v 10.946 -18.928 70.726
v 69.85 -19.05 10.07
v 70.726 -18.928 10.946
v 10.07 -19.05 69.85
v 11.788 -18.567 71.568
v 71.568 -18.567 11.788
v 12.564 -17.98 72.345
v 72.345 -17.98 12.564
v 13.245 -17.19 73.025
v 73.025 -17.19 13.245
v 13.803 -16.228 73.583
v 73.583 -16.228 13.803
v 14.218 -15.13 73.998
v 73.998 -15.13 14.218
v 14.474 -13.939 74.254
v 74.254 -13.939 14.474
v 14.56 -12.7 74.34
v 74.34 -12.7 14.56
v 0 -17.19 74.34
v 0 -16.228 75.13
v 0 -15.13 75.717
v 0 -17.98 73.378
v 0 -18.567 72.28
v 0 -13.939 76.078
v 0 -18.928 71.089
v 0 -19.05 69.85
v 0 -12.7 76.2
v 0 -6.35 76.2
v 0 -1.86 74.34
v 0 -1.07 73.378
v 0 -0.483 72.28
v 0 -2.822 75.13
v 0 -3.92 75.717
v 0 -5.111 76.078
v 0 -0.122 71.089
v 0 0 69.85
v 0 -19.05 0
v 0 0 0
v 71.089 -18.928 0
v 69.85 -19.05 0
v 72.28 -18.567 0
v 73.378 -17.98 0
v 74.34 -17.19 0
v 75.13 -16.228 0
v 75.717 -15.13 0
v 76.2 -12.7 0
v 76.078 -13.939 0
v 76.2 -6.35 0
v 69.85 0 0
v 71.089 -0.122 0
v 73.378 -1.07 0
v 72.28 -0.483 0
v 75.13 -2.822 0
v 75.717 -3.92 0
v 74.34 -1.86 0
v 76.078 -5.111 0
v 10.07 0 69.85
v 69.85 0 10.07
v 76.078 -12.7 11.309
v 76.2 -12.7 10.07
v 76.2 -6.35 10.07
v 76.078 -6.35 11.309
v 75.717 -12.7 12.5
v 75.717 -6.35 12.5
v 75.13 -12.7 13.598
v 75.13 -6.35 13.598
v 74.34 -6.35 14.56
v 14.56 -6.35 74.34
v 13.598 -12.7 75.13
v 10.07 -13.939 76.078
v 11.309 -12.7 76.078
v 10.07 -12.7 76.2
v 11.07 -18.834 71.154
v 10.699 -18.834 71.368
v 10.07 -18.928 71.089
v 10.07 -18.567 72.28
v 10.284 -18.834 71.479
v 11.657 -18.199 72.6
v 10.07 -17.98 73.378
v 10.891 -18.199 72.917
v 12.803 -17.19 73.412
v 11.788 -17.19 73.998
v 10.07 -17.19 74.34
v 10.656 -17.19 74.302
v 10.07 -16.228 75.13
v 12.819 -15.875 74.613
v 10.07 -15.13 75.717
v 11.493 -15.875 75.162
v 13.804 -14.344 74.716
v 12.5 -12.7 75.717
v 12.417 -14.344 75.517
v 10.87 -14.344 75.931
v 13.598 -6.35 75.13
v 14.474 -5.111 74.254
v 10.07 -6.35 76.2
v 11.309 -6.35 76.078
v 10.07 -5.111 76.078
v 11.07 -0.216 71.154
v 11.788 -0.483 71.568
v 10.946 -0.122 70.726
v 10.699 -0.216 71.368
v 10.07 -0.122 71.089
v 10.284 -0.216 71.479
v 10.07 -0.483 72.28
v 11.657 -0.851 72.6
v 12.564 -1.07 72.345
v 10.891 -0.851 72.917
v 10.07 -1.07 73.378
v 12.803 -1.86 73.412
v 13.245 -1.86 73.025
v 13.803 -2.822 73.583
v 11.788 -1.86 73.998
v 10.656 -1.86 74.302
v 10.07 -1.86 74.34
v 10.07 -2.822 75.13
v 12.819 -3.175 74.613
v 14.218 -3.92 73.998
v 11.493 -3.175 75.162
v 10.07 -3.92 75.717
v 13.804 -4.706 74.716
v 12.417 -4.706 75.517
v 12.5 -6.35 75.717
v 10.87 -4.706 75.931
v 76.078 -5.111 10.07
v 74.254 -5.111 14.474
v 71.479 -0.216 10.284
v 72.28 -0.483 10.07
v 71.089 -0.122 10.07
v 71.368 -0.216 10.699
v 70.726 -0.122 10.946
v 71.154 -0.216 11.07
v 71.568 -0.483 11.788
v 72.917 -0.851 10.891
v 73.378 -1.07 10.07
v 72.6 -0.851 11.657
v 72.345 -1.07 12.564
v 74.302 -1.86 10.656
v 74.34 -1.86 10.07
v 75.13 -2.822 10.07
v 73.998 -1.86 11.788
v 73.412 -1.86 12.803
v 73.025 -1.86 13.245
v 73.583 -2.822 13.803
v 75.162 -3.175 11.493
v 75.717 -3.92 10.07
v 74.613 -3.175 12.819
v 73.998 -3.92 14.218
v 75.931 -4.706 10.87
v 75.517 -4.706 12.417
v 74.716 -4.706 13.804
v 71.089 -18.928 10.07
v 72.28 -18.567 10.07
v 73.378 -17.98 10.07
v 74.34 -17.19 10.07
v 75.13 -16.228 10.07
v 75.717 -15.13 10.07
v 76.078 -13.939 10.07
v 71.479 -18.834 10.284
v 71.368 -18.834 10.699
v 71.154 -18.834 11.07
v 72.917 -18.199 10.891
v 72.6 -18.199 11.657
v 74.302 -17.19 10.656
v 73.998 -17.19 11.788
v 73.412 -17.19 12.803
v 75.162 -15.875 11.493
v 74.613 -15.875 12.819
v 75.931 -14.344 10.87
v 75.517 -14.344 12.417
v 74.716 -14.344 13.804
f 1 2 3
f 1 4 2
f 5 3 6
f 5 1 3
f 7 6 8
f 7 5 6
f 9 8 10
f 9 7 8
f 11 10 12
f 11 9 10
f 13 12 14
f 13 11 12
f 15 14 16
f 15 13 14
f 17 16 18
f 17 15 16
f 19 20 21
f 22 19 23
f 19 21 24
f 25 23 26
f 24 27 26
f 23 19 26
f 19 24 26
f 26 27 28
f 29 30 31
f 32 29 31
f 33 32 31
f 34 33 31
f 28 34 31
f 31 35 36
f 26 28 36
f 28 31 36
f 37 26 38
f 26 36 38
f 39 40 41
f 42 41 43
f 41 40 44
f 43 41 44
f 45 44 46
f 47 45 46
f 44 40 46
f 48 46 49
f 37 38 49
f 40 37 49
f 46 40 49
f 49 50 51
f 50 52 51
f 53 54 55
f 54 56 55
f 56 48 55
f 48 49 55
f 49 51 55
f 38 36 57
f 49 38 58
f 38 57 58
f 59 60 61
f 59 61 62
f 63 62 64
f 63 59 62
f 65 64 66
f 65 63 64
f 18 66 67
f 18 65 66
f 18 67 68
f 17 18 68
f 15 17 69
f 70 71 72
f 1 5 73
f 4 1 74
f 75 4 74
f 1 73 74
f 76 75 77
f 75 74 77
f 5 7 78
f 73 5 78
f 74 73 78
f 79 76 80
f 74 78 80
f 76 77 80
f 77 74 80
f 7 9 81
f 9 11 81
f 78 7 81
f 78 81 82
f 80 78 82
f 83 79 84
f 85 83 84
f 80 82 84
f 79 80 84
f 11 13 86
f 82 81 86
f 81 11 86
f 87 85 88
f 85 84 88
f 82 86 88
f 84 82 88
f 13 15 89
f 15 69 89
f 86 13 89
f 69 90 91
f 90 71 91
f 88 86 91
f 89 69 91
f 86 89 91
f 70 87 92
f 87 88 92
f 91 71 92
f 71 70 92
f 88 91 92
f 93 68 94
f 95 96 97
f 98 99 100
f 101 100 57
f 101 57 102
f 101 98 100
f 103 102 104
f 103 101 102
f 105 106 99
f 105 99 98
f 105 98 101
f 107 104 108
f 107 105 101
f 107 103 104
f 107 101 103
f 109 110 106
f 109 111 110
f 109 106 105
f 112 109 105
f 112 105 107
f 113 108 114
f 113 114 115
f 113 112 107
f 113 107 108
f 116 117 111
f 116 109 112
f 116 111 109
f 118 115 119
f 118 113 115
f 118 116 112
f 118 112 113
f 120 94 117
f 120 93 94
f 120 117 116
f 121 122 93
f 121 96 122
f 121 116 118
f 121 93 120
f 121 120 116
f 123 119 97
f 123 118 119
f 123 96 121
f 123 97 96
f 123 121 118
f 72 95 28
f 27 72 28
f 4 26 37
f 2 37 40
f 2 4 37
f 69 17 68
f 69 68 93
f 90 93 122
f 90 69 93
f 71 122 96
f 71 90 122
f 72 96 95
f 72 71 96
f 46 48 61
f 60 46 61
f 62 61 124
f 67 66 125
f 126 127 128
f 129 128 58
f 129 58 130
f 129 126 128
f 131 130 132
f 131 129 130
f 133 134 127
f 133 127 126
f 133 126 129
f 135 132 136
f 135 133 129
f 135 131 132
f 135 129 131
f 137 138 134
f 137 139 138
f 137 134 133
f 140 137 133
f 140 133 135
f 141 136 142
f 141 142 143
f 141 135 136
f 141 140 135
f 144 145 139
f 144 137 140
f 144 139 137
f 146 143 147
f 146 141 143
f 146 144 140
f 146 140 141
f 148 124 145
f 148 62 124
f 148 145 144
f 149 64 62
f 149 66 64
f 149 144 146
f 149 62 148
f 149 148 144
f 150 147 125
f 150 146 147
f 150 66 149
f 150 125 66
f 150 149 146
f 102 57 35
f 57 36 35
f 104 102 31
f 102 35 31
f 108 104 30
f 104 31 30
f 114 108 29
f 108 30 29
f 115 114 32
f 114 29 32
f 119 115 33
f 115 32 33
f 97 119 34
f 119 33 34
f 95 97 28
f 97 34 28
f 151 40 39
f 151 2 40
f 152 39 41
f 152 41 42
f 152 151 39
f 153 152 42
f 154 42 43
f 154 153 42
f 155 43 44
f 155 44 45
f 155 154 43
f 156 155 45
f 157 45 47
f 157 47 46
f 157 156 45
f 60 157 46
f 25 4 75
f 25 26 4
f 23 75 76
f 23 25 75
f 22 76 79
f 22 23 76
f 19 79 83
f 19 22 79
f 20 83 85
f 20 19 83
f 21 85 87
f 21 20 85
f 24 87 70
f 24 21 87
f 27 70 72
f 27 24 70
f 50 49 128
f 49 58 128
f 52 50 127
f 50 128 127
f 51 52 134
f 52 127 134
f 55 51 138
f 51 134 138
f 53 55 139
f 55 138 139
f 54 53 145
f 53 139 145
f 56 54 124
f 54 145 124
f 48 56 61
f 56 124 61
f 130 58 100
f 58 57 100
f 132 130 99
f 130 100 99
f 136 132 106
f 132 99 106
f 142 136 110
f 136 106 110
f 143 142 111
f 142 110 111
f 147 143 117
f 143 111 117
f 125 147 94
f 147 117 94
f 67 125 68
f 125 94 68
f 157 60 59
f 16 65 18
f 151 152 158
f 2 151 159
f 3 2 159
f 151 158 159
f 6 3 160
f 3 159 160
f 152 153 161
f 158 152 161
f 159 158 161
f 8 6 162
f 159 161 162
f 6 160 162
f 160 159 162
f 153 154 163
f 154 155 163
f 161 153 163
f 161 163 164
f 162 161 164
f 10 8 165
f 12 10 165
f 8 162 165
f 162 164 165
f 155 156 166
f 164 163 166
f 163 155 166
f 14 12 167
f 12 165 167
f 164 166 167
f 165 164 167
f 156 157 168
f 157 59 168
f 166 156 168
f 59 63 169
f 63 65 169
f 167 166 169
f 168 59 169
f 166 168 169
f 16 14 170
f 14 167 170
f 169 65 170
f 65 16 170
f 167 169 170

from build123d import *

# Parameters (mm, degrees)
F1_DEPTH = 19.05
F2_R     = 6.35
F3_R     = 6.35


with BuildPart() as f1:
    # F0 (on Front) → F1 (new body)
    with BuildSketch(Plane.XZ):
        Polygon((0, 76.2), (0, 0), (76.2, 0), (76.2, 12.7), (12.7, 76.2), align=None)
    extrude(amount=F1_DEPTH)

    # F2
    f2_edges = [f1.edges().sort_by_distance(p)[0] for p in [
        (12.7, -9.525, 76.2),
        (76.2, -9.525, 12.7),
    ]]
    fillet(f2_edges, radius=F2_R)

    # F3
    f3_edges = [f1.edges().sort_by_distance(p)[0] for p in [
        (44.45, -19.05, 44.45),
        (44.45, 0, 44.45),
    ]]
    fillet(f3_edges, radius=F3_R)


solid = f1.part
